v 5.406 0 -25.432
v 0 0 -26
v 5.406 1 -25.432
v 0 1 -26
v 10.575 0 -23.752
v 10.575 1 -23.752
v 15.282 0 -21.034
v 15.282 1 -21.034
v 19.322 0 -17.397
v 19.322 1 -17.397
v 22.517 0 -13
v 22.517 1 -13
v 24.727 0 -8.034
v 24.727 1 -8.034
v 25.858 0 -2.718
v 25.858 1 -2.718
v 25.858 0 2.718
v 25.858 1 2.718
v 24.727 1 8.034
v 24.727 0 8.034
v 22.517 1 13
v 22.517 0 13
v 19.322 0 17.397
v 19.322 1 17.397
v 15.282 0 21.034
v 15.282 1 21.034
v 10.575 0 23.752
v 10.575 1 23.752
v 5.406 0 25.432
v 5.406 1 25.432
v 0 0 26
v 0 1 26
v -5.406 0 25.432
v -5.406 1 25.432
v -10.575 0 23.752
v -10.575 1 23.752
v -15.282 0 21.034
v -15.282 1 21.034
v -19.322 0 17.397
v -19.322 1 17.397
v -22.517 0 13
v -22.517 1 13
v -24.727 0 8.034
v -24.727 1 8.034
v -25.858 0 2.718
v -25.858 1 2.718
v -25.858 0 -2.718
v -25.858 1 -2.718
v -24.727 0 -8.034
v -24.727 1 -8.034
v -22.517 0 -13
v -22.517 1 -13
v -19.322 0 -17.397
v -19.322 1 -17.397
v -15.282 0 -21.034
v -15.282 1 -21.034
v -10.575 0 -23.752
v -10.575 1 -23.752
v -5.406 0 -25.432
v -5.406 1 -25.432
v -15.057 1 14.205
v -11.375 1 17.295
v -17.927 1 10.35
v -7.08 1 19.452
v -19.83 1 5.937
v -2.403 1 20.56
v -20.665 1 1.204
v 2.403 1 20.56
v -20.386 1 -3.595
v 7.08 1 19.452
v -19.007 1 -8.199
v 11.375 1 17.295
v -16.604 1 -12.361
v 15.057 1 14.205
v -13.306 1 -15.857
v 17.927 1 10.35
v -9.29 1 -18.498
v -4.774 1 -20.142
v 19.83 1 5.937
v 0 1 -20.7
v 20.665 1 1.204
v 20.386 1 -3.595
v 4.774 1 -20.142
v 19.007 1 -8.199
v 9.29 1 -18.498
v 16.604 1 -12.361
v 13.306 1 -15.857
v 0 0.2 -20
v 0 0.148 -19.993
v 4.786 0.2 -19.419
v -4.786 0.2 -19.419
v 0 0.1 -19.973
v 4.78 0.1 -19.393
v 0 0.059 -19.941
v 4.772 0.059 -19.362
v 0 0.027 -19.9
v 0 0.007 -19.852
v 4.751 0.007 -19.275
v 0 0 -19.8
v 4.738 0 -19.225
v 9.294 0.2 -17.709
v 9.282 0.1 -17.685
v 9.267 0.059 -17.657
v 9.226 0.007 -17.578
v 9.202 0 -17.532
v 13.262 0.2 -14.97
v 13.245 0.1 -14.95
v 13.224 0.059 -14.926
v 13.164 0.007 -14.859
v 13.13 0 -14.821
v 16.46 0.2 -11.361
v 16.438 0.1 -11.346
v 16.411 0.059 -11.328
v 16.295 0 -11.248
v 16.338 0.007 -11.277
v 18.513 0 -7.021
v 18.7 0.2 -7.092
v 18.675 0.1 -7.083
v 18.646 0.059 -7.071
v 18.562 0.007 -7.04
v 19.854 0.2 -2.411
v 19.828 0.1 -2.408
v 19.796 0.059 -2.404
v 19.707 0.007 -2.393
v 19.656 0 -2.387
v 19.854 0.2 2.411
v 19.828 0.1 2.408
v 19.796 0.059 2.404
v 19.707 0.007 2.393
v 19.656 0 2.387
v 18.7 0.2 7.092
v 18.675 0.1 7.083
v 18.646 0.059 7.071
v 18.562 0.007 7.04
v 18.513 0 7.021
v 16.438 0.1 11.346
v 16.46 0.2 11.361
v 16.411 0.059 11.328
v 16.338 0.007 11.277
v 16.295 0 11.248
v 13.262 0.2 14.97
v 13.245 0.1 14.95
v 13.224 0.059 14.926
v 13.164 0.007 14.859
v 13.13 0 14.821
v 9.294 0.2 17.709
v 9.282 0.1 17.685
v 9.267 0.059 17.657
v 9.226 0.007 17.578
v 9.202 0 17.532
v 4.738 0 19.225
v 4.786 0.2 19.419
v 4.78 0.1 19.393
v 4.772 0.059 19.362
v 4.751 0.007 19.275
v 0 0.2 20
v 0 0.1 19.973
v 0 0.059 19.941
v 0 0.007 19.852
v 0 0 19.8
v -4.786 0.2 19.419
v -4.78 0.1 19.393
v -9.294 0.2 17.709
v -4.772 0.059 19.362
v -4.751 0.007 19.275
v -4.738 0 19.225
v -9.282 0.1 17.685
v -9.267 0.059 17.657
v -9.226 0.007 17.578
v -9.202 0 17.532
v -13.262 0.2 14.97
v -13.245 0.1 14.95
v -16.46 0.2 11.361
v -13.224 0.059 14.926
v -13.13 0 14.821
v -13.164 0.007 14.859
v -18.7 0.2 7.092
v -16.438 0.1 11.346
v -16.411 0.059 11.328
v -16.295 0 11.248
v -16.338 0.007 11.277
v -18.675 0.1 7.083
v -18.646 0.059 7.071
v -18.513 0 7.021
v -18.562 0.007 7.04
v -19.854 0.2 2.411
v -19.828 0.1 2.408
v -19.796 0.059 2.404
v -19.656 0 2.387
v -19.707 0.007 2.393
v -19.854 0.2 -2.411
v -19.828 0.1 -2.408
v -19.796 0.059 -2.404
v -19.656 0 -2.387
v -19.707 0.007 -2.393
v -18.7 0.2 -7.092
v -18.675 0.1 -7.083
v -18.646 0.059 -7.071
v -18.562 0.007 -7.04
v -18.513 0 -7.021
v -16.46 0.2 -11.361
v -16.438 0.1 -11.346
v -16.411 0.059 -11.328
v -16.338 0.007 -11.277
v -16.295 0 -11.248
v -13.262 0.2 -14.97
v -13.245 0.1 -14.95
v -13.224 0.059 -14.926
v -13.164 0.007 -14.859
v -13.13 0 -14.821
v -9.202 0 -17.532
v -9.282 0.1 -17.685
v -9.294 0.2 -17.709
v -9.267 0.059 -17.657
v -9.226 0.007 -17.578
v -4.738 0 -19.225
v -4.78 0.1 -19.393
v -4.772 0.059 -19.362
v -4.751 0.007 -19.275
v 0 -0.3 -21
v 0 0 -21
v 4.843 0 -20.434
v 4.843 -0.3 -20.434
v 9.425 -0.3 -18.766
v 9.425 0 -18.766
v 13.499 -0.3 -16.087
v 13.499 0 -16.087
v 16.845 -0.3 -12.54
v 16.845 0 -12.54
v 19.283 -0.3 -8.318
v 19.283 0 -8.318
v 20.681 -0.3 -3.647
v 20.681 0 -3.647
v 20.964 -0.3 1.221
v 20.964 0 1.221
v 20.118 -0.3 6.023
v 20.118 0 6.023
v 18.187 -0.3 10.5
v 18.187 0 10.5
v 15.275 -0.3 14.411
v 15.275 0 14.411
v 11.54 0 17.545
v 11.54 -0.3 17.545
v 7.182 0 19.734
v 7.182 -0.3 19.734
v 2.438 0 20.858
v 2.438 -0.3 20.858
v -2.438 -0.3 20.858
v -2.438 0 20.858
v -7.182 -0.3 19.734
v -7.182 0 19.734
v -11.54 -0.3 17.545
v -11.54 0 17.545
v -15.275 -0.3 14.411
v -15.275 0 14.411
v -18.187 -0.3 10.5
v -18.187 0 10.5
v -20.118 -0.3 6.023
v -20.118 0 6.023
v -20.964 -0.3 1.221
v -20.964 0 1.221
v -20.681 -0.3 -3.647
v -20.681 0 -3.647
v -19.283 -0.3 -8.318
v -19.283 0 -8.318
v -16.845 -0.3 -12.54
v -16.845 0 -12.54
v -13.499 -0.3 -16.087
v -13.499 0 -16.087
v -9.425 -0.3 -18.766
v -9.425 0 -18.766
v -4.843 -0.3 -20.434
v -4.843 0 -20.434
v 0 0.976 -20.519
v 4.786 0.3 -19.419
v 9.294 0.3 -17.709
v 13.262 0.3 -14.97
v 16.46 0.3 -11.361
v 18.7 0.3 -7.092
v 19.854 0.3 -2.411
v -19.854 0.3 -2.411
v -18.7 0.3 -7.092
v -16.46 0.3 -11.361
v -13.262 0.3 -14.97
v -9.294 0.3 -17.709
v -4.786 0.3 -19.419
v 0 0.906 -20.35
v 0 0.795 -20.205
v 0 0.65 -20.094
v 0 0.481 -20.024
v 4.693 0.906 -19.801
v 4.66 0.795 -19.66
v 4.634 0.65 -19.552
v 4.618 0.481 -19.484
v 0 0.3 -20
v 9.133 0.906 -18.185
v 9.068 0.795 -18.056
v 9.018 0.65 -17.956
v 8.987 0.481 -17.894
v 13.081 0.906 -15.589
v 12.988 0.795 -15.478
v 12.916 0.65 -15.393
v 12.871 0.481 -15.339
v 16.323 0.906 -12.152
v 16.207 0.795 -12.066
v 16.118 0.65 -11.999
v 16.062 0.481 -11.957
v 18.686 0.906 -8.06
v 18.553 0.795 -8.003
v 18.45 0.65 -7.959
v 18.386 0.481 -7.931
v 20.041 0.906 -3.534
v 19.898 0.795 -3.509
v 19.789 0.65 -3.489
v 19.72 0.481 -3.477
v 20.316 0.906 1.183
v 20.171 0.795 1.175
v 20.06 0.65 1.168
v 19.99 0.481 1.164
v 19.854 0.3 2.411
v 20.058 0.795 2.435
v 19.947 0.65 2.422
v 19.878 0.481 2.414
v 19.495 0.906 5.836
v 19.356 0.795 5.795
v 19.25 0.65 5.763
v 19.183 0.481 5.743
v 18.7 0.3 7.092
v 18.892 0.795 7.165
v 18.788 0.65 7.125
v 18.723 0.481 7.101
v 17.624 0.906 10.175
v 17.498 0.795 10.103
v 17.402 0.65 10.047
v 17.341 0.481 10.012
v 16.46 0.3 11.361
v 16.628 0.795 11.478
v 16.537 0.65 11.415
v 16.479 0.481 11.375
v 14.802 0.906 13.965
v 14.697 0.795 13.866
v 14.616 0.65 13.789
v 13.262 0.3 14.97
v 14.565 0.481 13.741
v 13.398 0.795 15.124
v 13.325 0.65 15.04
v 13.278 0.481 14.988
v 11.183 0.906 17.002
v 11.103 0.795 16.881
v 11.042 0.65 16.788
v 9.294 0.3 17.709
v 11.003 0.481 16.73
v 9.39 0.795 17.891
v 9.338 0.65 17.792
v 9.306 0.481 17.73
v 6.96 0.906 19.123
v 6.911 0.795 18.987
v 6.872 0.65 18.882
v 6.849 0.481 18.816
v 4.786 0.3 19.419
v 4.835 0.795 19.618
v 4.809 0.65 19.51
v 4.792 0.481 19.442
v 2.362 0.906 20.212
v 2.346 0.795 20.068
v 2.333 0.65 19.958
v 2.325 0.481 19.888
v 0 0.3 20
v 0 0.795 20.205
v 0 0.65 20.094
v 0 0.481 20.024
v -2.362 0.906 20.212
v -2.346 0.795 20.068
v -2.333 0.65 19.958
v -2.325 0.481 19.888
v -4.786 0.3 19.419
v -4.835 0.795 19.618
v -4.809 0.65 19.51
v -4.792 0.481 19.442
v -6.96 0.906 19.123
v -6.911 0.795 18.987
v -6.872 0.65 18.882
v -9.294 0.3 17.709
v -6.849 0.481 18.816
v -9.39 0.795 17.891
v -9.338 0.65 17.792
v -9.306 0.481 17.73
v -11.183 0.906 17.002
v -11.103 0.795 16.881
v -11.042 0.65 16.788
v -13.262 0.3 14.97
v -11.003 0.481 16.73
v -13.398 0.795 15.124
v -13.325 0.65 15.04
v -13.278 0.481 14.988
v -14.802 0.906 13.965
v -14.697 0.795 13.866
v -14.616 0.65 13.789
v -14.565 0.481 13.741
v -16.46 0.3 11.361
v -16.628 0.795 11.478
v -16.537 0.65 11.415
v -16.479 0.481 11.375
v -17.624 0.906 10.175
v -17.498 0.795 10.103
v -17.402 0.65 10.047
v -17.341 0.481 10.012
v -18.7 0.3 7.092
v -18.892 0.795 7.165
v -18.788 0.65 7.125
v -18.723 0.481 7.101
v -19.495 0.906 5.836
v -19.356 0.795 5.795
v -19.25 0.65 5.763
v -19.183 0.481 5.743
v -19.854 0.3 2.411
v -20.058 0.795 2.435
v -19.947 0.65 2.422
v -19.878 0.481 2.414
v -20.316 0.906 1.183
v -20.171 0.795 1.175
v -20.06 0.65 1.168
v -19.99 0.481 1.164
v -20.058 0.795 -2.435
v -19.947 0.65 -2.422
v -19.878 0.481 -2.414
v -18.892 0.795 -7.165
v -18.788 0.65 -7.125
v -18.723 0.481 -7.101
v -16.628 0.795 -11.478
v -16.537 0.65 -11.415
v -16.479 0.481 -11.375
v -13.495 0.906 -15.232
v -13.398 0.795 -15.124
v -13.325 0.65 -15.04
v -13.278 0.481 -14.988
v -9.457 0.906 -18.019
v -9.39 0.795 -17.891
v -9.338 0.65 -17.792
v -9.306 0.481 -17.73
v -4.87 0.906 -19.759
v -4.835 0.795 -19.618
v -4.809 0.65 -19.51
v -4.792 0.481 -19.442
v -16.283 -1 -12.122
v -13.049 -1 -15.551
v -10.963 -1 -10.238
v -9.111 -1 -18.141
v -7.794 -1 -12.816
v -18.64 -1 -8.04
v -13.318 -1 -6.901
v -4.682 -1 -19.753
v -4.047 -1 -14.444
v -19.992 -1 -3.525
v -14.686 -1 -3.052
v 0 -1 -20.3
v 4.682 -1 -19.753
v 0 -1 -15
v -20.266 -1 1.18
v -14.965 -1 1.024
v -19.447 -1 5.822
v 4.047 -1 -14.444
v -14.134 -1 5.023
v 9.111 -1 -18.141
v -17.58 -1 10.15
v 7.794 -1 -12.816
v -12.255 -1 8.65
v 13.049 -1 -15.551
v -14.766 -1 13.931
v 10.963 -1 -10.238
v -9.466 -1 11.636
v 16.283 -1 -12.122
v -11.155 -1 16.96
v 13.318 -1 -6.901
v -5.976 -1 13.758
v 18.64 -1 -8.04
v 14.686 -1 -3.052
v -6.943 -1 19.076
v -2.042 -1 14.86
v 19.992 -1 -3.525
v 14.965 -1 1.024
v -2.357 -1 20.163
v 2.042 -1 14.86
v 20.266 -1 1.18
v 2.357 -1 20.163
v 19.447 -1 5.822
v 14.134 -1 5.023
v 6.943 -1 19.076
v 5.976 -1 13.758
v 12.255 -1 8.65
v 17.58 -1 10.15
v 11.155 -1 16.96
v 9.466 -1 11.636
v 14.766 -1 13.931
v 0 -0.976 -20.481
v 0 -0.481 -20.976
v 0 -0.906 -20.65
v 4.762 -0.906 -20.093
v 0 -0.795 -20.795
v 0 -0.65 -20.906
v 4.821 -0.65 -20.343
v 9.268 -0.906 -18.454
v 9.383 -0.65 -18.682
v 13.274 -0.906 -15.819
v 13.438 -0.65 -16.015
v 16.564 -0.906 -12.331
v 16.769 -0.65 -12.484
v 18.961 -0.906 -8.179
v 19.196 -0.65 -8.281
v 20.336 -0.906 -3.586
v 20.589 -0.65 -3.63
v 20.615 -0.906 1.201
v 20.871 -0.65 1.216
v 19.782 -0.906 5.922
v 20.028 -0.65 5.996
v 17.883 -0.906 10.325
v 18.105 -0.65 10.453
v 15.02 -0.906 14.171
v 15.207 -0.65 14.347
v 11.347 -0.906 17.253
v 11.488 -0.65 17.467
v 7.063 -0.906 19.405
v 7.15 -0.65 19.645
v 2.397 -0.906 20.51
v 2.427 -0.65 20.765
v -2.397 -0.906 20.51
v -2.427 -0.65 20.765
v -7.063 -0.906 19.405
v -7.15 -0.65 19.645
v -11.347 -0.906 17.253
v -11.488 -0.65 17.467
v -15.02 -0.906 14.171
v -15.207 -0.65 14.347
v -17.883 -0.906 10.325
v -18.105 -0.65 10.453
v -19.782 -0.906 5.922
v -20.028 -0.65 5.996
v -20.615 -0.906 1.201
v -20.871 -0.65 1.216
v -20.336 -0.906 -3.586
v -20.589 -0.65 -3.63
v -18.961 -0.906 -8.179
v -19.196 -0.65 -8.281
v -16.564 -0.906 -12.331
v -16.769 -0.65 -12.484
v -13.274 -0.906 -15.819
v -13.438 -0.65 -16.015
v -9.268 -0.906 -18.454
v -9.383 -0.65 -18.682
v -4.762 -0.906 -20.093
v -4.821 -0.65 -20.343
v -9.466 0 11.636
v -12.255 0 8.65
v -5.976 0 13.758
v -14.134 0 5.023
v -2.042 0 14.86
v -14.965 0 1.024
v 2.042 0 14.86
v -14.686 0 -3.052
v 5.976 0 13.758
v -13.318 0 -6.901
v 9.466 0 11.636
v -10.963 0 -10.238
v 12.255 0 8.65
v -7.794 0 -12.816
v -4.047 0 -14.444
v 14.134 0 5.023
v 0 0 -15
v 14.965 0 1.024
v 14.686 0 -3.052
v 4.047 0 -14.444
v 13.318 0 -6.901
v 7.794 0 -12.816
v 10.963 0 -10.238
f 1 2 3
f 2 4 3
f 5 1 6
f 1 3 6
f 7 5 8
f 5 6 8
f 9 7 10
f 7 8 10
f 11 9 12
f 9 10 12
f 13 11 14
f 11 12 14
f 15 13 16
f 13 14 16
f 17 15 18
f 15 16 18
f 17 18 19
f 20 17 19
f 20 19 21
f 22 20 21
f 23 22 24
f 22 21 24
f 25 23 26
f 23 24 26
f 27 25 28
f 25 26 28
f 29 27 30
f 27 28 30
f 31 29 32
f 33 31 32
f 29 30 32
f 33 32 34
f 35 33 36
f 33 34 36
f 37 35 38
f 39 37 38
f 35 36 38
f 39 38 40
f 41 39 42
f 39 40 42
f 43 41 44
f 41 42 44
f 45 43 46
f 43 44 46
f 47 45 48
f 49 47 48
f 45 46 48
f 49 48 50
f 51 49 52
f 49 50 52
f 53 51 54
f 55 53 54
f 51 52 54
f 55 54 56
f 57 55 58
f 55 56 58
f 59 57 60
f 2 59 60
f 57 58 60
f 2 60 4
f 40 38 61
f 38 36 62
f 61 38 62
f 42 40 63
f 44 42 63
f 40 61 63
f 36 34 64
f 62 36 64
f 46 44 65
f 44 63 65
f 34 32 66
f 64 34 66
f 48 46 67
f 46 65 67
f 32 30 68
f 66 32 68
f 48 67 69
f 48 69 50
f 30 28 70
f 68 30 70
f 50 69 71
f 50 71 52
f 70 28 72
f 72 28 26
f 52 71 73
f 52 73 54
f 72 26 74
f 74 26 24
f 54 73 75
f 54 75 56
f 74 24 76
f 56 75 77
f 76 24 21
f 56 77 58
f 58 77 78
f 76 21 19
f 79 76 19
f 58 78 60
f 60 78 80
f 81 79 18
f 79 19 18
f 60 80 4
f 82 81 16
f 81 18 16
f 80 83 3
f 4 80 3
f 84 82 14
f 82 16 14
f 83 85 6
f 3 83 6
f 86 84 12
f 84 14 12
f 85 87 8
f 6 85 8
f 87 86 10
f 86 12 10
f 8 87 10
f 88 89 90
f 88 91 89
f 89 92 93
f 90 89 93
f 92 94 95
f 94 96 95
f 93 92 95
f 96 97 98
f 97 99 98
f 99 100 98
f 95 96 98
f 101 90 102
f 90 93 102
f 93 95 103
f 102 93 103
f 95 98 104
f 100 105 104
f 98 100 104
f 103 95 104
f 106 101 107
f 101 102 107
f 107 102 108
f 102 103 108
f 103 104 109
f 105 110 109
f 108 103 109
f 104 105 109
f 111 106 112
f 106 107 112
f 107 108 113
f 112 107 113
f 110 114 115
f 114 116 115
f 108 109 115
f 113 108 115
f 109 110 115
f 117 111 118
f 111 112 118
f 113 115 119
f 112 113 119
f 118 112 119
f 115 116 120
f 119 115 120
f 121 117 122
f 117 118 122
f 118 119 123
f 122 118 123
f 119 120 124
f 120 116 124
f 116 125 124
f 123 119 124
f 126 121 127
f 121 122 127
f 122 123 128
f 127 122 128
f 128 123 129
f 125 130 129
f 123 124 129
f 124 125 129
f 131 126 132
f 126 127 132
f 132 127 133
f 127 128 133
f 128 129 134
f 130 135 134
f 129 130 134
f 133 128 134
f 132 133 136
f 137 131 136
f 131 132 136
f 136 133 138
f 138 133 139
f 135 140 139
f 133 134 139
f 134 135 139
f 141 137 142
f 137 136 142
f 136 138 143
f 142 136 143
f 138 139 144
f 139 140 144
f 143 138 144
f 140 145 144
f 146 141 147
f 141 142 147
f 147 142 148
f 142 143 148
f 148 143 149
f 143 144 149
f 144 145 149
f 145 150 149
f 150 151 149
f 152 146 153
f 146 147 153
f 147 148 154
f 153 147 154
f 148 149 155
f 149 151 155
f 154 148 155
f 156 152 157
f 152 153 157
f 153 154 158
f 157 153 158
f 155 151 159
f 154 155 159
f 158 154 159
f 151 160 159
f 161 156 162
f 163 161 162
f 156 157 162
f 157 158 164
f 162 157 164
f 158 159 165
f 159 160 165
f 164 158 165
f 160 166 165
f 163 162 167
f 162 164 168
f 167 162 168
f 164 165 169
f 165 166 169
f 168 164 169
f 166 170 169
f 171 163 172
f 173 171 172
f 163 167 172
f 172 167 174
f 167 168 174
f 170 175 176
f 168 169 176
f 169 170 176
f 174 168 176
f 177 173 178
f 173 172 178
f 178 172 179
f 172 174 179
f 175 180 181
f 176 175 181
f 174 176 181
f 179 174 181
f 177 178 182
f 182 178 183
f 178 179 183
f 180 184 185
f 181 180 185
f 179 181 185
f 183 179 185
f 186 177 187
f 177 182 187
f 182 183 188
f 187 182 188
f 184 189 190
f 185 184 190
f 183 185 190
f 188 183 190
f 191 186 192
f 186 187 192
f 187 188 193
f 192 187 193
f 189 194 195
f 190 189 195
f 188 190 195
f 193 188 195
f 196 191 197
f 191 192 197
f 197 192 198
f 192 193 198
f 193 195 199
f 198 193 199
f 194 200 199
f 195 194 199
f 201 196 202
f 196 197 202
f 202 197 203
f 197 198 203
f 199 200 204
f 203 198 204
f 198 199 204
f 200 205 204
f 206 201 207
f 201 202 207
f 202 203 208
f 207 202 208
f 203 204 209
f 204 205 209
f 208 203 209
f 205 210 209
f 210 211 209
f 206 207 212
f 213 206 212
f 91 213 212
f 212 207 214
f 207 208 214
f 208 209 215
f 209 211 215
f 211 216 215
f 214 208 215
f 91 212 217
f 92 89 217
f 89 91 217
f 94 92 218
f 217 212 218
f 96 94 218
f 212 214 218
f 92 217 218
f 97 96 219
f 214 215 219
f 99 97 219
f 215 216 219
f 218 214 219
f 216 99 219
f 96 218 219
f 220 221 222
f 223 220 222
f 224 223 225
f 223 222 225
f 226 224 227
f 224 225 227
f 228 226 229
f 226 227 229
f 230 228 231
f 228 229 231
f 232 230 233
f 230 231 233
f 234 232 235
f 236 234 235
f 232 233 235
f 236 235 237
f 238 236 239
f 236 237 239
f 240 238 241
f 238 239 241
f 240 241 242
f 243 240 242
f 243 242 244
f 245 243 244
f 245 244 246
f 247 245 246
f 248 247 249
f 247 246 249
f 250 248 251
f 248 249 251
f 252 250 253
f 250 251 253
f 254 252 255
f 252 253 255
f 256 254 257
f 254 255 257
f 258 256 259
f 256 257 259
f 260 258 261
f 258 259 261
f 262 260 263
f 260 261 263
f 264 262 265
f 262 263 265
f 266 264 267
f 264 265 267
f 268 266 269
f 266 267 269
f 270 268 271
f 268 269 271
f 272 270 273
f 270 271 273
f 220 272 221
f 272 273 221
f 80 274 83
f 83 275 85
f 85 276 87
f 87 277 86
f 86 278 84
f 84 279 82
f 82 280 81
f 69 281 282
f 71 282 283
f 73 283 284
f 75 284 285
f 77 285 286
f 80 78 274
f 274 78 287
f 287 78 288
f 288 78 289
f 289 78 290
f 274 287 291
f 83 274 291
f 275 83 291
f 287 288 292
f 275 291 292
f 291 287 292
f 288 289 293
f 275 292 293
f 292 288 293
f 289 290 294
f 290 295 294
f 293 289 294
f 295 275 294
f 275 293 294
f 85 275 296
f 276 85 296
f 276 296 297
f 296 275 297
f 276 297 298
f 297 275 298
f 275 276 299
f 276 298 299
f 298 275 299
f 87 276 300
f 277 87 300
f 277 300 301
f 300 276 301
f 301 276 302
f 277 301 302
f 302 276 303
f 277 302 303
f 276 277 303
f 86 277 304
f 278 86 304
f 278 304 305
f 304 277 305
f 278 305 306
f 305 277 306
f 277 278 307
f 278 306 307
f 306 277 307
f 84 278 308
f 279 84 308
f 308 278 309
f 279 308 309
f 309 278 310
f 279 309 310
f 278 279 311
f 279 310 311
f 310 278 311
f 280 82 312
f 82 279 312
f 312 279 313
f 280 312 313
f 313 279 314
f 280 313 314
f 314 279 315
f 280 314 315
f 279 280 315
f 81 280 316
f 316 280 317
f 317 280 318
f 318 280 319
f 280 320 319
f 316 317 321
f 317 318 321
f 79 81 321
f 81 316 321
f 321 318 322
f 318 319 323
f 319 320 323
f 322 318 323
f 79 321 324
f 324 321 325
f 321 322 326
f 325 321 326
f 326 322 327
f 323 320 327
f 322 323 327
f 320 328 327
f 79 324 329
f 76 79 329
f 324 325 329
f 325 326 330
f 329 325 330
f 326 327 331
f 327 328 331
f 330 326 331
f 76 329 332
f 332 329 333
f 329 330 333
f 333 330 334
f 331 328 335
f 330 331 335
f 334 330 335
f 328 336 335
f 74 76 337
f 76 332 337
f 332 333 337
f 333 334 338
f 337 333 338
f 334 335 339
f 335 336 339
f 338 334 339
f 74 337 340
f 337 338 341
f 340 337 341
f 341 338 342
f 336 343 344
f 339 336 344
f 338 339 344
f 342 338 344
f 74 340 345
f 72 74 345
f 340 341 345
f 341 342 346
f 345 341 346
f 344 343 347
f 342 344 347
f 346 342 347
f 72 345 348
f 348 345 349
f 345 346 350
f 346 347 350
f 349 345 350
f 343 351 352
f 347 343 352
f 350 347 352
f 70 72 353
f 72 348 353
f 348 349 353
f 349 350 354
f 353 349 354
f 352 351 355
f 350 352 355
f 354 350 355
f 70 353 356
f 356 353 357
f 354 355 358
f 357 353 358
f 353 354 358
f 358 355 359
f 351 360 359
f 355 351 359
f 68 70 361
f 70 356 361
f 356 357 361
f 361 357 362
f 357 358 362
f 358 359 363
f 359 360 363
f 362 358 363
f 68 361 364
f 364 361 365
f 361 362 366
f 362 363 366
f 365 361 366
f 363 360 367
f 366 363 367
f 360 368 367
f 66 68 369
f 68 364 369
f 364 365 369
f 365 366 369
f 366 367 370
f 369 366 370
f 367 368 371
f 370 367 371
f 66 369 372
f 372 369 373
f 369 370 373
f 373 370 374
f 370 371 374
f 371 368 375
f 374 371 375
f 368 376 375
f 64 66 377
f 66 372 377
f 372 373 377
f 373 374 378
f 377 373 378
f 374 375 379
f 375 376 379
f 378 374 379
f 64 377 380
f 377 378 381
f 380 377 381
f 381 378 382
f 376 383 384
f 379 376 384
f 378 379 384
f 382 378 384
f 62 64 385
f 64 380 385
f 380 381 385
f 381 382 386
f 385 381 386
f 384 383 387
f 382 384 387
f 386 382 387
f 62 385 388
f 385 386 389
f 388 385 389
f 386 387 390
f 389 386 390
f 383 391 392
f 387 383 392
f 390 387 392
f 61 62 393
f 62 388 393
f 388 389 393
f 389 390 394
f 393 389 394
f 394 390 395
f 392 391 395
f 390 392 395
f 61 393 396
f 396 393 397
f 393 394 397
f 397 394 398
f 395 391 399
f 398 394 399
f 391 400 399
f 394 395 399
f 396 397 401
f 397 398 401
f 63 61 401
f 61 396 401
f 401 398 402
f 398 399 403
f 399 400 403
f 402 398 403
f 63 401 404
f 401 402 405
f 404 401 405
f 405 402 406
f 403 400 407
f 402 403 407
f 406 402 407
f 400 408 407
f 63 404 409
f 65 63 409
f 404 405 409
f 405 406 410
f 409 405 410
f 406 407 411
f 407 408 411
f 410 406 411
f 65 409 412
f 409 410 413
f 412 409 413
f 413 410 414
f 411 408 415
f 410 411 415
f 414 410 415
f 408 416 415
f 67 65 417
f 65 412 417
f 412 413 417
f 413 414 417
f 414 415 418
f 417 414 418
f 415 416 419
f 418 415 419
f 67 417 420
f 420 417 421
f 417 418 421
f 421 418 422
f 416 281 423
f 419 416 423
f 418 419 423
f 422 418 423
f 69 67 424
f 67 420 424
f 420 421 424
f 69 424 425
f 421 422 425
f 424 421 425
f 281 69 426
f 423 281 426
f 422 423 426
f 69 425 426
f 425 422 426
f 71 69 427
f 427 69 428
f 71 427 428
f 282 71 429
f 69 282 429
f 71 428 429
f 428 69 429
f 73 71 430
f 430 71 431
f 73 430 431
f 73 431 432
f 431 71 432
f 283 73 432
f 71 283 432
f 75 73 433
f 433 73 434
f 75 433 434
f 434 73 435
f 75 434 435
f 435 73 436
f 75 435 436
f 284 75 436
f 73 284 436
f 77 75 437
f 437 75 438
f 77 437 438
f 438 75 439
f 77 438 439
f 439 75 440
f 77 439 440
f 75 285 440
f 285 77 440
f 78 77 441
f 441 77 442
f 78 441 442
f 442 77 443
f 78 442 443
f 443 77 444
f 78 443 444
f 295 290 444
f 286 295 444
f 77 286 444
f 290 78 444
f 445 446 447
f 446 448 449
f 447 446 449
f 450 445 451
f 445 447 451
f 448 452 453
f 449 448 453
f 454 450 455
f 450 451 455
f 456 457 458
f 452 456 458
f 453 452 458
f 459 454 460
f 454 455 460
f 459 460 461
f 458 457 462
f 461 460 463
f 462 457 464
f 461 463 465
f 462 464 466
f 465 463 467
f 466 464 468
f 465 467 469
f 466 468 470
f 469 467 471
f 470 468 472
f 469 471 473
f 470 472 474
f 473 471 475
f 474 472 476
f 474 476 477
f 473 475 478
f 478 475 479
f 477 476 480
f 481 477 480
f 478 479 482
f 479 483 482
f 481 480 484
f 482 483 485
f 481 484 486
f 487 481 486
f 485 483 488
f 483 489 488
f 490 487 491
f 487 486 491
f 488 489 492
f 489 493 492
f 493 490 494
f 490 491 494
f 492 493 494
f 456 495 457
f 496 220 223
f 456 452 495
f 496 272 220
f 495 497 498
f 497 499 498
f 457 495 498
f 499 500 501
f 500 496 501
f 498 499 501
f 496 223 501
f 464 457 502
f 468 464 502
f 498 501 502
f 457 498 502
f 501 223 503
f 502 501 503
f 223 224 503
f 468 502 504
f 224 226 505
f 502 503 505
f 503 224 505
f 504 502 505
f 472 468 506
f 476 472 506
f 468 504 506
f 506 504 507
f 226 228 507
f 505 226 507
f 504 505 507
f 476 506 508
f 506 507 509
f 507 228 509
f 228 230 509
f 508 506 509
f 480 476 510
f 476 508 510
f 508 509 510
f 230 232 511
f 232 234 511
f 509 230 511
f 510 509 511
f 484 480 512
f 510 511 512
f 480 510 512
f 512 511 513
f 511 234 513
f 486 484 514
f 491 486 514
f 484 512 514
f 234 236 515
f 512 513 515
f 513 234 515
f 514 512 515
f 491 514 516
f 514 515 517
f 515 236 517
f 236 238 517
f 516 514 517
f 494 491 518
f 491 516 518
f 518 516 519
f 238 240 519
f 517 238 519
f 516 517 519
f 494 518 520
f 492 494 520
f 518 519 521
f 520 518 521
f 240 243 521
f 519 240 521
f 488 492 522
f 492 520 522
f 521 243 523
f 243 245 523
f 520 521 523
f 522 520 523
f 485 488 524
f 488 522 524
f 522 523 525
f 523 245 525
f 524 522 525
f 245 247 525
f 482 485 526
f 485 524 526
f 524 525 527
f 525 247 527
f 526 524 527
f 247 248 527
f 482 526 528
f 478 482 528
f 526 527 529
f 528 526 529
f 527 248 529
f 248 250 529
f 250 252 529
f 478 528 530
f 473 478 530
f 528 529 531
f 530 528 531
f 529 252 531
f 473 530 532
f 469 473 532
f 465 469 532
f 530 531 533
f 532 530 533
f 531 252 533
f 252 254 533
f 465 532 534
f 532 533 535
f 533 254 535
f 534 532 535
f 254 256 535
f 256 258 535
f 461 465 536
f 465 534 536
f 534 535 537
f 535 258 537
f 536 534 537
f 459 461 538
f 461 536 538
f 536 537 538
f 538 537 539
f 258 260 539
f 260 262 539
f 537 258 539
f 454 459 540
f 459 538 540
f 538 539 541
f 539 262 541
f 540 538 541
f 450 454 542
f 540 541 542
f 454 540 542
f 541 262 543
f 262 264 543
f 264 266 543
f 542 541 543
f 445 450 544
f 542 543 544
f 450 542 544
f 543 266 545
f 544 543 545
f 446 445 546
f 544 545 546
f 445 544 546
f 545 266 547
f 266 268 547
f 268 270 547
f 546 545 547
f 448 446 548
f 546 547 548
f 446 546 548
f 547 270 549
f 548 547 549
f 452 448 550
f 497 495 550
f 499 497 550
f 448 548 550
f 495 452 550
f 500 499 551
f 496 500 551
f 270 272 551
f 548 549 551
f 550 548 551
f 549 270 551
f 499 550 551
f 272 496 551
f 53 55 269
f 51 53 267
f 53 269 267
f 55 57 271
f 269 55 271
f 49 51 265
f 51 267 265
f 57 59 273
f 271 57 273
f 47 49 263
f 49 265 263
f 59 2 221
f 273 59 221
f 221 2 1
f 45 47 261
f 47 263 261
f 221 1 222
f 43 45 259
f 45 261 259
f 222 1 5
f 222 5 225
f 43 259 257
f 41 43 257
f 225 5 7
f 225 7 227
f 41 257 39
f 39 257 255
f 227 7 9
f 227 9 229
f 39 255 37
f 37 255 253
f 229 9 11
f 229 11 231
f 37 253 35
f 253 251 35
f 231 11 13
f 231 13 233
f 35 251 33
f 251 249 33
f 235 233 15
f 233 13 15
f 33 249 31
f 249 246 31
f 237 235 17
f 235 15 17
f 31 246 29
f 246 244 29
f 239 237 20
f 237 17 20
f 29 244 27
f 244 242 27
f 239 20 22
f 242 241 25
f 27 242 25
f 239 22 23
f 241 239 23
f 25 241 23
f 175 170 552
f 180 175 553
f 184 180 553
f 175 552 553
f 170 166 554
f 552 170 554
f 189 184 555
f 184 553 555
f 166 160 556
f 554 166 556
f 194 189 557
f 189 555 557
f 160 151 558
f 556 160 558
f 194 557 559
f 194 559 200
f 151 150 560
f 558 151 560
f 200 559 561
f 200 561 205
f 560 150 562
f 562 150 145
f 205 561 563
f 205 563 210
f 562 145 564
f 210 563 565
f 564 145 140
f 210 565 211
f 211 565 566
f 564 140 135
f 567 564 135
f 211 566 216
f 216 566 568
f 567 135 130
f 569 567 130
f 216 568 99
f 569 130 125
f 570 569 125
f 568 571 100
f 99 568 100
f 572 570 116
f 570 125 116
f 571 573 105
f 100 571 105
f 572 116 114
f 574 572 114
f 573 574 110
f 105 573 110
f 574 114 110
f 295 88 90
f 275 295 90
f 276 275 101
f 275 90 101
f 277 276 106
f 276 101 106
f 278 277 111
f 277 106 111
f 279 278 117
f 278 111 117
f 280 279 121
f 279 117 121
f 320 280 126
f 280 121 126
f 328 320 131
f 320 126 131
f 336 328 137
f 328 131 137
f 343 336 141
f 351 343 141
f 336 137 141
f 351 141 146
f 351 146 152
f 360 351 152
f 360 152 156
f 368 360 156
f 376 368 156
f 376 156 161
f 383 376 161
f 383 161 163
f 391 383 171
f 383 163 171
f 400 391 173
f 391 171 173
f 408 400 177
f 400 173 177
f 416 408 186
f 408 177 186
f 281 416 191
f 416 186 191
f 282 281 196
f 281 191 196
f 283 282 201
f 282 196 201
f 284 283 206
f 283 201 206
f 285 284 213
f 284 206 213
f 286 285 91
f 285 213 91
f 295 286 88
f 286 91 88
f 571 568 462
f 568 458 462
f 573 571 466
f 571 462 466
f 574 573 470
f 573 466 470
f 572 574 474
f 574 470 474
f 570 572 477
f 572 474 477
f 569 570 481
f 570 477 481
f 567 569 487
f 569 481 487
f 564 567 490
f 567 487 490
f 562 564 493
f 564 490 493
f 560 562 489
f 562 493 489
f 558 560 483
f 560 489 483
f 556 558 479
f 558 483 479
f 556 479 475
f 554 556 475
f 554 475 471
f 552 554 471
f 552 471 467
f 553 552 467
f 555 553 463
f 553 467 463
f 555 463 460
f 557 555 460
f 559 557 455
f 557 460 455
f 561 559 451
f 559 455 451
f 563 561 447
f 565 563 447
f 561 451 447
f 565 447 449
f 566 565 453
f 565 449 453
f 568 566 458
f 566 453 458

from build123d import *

# Parameters (mm, degrees)
CONG_1_R = 0.7
CONG_2_R = 0.2


with BuildPart() as part:
    # Esquisse1 → Base-Révol.-Mince (revolve)
    with BuildSketch(Plane.XY, mode=Mode.PRIVATE) as base_r_vol_mince_sk:
        Polygon((-26, 1), (-20, 1), (-20, 0), (-15, 0), (-15, -1), (-21, -1), (-21, 0), (-26, 0), align=None)
    revolve(base_r_vol_mince_sk.sketch.rotate(Axis((0, 0, 0), (0, -1, 0)), 90), axis=Axis((0, 0, 0), (0, -1, 0)))

    # Congé1
    cong_1_edges = [part.edges().sort_by_distance(p)[0] for p in [
        (0, 1, 20),
        (0, -1, 21),
    ]]
    fillet(cong_1_edges, radius=CONG_1_R)

    # Congé2
    cong_2_edges = [part.edges().sort_by_distance(p)[0] for p in [
        (0, 0, 20),
    ]]
    fillet(cong_2_edges, radius=CONG_2_R)


solid = part.part
